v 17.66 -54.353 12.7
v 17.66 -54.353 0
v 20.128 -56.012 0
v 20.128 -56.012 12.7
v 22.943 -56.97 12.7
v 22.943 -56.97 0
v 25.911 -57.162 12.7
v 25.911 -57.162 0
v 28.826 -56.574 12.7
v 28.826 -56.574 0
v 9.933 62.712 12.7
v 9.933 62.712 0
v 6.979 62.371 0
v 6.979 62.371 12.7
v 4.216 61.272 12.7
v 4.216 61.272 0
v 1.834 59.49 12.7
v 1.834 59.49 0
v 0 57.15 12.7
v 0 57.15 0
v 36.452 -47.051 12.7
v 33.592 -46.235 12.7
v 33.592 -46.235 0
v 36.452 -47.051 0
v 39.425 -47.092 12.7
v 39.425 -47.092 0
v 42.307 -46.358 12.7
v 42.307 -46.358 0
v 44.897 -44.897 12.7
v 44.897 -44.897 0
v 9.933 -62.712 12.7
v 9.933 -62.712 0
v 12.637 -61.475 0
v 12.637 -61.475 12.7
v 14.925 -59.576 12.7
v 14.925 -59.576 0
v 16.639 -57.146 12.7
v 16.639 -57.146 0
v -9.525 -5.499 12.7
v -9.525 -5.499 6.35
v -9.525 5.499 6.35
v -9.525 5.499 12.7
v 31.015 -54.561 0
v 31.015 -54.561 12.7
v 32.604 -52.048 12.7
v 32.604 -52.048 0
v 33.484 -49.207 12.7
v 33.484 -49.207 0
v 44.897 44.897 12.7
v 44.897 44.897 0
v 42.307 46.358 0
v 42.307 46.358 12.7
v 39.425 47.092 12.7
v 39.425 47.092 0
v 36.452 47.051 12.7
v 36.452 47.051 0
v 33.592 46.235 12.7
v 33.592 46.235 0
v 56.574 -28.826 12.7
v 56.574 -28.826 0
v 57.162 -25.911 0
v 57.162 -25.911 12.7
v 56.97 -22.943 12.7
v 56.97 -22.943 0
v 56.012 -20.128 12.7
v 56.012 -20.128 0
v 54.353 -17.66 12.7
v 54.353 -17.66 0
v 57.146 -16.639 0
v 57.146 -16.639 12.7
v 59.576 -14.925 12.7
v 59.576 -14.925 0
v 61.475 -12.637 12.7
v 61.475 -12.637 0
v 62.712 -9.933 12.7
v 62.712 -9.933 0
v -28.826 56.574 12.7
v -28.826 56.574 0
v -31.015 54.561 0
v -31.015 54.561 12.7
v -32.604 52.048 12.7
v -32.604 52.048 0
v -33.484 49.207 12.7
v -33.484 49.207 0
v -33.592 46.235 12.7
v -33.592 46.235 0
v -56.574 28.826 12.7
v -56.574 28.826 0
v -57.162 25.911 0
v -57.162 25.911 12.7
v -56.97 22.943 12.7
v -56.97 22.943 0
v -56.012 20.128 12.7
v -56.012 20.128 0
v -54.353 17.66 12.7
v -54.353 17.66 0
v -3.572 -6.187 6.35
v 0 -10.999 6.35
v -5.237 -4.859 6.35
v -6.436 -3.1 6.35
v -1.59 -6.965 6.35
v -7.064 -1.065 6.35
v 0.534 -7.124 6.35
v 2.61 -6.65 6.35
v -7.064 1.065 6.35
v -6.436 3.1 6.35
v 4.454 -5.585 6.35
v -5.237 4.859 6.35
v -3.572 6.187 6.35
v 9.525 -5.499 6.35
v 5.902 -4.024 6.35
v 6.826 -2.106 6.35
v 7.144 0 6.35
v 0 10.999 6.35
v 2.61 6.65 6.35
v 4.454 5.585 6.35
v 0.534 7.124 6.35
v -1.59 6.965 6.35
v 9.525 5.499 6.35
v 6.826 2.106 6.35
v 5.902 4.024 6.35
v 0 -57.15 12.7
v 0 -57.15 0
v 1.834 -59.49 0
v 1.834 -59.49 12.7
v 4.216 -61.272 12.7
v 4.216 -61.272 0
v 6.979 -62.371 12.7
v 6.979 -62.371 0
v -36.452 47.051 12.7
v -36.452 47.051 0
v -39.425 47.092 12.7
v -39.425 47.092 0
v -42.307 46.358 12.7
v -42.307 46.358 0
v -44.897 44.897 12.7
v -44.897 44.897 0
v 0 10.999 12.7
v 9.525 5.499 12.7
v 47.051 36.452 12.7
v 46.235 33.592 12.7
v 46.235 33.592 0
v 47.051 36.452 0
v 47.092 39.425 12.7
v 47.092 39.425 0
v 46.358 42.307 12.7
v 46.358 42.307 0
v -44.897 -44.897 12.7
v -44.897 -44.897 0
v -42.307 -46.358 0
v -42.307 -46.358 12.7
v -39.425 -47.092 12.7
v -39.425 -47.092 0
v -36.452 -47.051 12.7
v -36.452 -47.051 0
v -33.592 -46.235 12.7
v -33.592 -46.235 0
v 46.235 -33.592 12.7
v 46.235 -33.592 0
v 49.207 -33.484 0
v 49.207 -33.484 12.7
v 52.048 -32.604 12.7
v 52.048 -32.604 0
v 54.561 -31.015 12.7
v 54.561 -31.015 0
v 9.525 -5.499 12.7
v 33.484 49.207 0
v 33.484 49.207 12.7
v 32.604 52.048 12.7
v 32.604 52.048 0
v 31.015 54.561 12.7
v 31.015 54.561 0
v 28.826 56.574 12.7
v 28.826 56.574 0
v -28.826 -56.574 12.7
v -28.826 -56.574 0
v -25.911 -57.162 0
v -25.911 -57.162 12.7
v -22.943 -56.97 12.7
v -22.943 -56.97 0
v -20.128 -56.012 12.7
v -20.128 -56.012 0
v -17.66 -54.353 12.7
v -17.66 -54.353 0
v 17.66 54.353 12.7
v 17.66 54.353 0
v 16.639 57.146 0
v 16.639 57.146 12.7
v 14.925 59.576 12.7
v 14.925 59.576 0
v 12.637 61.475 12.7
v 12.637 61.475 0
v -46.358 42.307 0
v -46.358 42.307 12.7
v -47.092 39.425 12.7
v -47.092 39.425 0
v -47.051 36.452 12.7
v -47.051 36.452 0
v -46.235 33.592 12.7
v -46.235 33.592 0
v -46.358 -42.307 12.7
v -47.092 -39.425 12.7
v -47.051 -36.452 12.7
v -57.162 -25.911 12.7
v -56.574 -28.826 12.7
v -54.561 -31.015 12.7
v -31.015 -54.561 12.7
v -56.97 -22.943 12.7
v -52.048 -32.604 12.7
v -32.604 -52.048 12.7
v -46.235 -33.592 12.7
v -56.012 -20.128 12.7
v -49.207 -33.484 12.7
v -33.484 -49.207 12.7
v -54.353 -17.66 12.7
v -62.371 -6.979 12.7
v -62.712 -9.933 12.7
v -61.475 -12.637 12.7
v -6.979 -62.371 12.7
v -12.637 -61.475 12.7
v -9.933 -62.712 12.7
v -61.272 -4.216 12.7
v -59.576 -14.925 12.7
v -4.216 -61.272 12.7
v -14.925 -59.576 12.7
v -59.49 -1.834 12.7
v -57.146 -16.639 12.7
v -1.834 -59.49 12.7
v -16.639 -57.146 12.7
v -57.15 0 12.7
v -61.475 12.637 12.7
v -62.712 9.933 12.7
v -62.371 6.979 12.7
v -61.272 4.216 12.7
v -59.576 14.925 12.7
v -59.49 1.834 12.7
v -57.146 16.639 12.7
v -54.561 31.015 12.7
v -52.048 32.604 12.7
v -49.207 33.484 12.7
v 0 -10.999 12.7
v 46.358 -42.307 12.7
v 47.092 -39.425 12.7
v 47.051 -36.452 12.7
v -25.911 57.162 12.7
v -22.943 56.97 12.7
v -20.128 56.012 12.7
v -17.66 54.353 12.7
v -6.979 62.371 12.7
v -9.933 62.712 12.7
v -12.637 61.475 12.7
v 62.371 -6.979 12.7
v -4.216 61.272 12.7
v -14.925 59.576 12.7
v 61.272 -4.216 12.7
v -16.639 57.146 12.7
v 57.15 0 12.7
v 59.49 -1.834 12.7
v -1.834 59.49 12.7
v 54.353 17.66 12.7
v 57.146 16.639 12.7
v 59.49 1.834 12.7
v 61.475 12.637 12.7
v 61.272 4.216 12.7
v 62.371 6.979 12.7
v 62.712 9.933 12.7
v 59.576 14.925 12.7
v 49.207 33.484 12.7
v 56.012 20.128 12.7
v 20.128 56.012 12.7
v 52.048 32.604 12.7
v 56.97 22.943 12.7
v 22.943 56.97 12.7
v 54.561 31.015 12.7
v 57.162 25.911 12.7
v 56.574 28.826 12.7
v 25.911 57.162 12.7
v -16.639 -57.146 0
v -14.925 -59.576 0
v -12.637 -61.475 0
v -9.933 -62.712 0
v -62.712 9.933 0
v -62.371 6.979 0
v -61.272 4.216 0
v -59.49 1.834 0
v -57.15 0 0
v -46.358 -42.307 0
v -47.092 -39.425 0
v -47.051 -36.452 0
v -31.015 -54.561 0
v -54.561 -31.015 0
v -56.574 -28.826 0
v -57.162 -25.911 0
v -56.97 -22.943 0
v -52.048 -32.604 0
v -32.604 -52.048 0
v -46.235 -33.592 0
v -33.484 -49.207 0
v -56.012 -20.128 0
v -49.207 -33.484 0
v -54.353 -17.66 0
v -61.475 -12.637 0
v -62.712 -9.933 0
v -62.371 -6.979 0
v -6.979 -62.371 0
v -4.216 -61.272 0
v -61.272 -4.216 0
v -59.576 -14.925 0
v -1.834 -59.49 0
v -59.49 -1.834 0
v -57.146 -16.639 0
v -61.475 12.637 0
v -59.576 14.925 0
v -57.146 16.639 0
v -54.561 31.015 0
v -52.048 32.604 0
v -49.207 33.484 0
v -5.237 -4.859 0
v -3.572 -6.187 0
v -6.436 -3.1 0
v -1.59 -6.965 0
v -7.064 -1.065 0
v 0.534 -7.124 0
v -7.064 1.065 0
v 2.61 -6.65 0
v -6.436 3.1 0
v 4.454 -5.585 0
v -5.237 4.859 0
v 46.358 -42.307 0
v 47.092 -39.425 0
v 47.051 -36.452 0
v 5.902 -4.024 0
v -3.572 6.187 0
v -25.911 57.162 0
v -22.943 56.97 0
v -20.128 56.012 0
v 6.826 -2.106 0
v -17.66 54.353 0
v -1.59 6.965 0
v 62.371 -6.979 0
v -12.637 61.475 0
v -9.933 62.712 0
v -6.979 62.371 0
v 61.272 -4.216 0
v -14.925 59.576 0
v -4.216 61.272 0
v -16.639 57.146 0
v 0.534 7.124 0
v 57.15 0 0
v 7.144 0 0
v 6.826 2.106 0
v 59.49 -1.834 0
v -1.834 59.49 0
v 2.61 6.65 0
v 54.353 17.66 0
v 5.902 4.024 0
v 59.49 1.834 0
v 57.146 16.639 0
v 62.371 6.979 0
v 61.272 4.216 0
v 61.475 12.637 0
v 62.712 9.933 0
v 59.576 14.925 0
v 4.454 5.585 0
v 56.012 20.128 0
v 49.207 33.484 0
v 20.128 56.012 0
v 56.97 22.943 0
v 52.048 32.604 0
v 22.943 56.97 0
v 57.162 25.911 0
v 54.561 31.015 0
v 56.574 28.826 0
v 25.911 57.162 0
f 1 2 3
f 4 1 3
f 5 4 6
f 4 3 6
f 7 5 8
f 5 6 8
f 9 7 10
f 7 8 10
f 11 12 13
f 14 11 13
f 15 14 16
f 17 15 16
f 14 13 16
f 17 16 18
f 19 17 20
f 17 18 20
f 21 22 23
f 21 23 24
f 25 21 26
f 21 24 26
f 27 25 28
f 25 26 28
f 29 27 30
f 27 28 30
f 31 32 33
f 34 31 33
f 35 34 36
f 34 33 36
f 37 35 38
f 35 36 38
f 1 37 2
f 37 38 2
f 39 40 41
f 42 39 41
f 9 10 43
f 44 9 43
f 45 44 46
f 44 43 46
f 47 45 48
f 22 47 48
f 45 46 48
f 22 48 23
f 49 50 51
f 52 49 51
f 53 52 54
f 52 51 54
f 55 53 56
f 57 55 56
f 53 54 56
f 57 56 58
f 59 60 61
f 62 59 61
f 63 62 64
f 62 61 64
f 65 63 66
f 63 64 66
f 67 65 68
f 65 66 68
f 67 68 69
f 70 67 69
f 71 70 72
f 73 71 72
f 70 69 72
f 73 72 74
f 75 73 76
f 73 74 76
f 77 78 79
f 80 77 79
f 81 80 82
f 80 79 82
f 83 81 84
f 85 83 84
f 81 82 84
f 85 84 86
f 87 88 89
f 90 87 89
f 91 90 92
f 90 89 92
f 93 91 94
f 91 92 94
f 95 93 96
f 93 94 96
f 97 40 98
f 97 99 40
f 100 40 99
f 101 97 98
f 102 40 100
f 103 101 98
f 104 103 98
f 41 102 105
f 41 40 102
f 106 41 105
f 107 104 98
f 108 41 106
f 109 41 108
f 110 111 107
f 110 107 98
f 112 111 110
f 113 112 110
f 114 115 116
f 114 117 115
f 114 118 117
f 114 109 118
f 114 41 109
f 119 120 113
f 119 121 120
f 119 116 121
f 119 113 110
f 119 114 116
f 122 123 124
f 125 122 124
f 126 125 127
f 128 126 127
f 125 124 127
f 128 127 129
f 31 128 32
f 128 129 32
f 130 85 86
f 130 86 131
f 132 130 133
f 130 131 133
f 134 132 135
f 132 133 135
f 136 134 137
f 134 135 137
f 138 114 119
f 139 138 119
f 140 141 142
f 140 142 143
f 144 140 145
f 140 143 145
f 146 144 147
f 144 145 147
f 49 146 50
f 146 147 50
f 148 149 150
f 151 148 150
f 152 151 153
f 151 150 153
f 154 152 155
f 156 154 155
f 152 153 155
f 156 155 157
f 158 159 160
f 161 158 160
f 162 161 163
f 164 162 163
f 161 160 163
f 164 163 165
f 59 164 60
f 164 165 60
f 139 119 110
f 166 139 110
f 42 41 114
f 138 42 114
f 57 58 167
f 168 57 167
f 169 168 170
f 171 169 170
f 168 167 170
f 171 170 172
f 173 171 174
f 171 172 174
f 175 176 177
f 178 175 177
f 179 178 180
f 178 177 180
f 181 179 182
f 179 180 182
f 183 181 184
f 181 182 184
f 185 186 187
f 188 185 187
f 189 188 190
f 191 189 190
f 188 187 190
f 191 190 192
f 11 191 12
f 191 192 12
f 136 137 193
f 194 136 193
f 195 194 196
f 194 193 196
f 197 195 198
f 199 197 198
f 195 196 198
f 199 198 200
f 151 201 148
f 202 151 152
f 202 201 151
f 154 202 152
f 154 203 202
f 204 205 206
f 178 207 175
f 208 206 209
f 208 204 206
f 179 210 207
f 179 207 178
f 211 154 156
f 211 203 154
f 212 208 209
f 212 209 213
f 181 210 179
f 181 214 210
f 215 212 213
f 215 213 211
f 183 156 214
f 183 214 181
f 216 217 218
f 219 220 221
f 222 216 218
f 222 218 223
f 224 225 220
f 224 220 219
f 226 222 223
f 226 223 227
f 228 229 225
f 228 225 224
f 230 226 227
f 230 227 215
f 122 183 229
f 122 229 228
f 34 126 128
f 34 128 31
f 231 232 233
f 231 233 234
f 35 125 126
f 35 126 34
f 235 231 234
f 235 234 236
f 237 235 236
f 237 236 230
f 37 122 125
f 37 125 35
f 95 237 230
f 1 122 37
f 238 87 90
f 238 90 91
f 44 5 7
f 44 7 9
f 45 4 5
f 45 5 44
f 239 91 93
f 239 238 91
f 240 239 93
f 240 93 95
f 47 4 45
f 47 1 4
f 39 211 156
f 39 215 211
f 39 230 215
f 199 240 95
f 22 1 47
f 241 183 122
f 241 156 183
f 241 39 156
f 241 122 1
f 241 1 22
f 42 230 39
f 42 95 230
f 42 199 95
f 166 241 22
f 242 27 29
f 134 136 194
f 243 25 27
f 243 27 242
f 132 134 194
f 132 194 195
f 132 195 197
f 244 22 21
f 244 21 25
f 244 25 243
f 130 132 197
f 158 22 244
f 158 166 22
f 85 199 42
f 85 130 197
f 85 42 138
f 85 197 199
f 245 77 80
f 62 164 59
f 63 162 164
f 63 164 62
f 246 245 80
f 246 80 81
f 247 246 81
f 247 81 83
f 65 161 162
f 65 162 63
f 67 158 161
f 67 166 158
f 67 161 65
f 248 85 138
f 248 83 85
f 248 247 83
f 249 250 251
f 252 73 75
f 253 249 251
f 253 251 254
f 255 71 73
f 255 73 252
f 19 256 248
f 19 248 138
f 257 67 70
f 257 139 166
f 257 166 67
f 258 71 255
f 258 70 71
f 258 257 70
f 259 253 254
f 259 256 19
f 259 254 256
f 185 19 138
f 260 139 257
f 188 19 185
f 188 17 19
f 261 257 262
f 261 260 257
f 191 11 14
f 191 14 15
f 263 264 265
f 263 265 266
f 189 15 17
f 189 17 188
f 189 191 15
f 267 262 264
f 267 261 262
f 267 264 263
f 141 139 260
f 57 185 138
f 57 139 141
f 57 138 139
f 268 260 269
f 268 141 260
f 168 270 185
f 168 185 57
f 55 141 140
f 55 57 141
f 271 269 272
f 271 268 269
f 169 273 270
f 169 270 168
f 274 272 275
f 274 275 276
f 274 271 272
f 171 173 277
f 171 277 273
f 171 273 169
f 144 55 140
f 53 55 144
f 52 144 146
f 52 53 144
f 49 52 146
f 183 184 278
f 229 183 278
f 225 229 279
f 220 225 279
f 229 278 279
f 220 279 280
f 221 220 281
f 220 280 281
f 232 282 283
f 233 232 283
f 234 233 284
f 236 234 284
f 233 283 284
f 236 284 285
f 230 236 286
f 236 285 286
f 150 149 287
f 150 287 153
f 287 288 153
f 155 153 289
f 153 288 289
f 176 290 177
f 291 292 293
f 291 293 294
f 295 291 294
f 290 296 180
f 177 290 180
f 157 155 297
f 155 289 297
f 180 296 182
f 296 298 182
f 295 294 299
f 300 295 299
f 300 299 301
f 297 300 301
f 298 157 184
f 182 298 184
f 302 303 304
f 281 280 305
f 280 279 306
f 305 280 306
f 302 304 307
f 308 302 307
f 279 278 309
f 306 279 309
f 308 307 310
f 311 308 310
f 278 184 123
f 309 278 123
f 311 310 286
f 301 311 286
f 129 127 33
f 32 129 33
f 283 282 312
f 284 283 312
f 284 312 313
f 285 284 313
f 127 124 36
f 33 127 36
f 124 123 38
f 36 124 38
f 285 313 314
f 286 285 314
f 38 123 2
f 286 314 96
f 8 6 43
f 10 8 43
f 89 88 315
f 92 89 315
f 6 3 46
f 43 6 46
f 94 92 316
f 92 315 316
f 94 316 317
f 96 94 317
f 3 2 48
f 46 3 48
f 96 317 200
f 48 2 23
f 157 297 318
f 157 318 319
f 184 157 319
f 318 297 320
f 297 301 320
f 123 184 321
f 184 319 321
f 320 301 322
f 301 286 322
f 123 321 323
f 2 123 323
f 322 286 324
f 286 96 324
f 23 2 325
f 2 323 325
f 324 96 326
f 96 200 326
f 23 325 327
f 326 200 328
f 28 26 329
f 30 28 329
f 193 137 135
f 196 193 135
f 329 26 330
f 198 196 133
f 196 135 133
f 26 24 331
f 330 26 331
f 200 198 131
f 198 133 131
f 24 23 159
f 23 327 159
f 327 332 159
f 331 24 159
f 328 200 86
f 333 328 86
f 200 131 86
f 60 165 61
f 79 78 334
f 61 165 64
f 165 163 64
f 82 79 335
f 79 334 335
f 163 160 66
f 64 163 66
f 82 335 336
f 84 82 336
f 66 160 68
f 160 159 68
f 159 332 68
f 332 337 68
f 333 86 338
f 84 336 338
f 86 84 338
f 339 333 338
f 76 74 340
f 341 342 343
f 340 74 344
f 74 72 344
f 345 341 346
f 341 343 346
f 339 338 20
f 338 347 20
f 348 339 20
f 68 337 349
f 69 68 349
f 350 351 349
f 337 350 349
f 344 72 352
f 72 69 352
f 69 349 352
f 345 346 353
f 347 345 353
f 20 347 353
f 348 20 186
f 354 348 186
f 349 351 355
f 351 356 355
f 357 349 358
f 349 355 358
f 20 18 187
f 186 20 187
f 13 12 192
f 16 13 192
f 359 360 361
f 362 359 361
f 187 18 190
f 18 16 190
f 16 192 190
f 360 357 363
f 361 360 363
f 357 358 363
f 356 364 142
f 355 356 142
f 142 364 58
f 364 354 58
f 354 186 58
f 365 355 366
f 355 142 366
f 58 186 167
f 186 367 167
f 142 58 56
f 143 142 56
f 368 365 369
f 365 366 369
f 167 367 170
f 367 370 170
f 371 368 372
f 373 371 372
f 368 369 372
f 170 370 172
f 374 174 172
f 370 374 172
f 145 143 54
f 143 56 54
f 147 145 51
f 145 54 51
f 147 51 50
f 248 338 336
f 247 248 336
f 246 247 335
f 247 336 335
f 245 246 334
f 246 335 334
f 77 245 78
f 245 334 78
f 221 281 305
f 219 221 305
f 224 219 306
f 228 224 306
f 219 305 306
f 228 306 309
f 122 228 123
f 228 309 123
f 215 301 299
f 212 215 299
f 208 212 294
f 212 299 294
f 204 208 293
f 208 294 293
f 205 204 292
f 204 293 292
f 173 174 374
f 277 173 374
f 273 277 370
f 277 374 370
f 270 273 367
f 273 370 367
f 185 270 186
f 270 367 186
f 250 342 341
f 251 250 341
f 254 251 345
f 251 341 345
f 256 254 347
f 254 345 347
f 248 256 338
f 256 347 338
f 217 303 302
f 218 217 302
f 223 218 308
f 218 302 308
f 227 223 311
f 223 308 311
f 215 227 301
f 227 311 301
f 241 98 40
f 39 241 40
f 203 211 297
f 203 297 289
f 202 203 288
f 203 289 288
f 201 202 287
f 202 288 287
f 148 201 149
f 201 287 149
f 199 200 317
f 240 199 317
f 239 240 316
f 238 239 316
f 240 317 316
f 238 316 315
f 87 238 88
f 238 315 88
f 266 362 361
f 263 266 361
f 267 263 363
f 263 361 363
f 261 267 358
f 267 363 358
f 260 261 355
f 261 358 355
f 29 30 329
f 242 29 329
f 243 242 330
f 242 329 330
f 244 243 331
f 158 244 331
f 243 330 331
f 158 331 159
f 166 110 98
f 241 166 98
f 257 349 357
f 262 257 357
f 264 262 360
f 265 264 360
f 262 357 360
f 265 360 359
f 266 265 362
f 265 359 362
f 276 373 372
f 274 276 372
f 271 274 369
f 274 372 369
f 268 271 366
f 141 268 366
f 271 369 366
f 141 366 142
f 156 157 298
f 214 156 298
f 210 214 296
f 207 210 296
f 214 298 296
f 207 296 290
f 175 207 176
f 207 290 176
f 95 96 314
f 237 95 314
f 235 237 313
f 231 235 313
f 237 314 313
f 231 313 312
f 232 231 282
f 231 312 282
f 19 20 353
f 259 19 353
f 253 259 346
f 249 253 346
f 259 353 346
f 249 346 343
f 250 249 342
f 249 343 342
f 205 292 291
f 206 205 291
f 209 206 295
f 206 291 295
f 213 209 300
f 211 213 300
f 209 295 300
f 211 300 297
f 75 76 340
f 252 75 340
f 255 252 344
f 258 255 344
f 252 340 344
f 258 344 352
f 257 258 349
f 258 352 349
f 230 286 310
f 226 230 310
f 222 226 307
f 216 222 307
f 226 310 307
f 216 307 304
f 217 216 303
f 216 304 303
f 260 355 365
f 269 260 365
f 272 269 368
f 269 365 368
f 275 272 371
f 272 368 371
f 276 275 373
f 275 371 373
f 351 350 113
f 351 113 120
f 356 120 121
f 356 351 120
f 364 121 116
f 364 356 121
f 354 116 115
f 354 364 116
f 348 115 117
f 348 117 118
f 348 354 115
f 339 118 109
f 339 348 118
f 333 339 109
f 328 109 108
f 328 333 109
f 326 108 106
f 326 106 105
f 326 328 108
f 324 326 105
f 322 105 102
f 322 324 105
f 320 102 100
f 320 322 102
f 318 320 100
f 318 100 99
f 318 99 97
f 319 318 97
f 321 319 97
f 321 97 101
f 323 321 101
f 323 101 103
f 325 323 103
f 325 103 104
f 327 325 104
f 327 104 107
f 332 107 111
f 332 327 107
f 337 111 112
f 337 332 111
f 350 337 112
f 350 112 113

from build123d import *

# Parameters (mm, degrees)
F2_DEPTH = 12.7
F1_R     = 7.14375
F3_DEPTH = 6.35


with BuildPart() as f2:
    # F1 (on Top) → F2 (new body)
    with BuildSketch(Plane.XY):
        with BuildLine():
            ThreePointArc((57.15, 0), (61.2719466085, 4.2155230865), (62.7124900485, 9.9326826377))
            ThreePointArc((62.7124900485, 9.9326826377), (59.575752362, 14.9248720794), (54.3528799063, 17.6603212285))
            ThreePointArc((54.3528799063, 17.6603212285), (56.9704158142, 22.9432734815), (56.5737545789, 28.8257677314))
            ThreePointArc((56.5737545789, 28.8257677314), (52.0478683856, 32.6043167785), (46.2353212285, 33.5919271685))
            ThreePointArc((46.2353212285, 33.5919271685), (47.0922237837, 39.4251764129), (44.8971858387, 44.8971858387))
            ThreePointArc((44.8971858387, 44.8971858387), (39.4251764129, 47.0922237837), (33.5919271685, 46.2353212285))
            ThreePointArc((33.5919271685, 46.2353212285), (32.6043167785, 52.0478683856), (28.8257677314, 56.5737545789))
            ThreePointArc((28.8257677314, 56.5737545789), (22.9432734815, 56.9704158142), (17.6603212285, 54.3528799063))
            ThreePointArc((17.6603212285, 54.3528799063), (14.9248720794, 59.575752362), (9.9326826377, 62.7124900485))
            ThreePointArc((9.9326826377, 62.7124900485), (4.2155230865, 61.2719466085), (0, 57.15))
            ThreePointArc((0, 57.15), (-4.2155230865, 61.2719466085), (-9.9326826377, 62.7124900485))
            ThreePointArc((-9.9326826377, 62.7124900485), (-14.9248720794, 59.575752362), (-17.6603212285, 54.3528799063))
            ThreePointArc((-17.6603212285, 54.3528799063), (-22.9432734815, 56.9704158142), (-28.8257677314, 56.5737545789))
            ThreePointArc((-28.8257677314, 56.5737545789), (-32.6043167785, 52.0478683856), (-33.5919271685, 46.2353212285))
            ThreePointArc((-33.5919271685, 46.2353212285), (-39.4251764129, 47.0922237837), (-44.8971858387, 44.8971858387))
            ThreePointArc((-44.8971858387, 44.8971858387), (-47.0922237837, 39.4251764129), (-46.2353212285, 33.5919271685))
            ThreePointArc((-46.2353212285, 33.5919271685), (-52.0478683856, 32.6043167785), (-56.5737545789, 28.8257677314))
            ThreePointArc((-56.5737545789, 28.8257677314), (-56.9704158142, 22.9432734815), (-54.3528799063, 17.6603212285))
            ThreePointArc((-54.3528799063, 17.6603212285), (-59.575752362, 14.9248720794), (-62.7124900485, 9.9326826377))
            ThreePointArc((-62.7124900485, 9.9326826377), (-61.2719466085, 4.2155230865), (-57.15, 0))
            ThreePointArc((-57.15, 0), (-61.2719466085, -4.2155230865), (-62.7124900485, -9.9326826377))
            ThreePointArc((-62.7124900485, -9.9326826377), (-59.575752362, -14.9248720794), (-54.3528799063, -17.6603212285))
            ThreePointArc((-54.3528799063, -17.6603212285), (-56.9704158142, -22.9432734815), (-56.5737545789, -28.8257677314))
            ThreePointArc((-56.5737545789, -28.8257677314), (-52.0478683856, -32.6043167785), (-46.2353212285, -33.5919271685))
            ThreePointArc((-46.2353212285, -33.5919271685), (-47.0922237837, -39.4251764129), (-44.8971858387, -44.8971858387))
            ThreePointArc((-44.8971858387, -44.8971858387), (-39.4251764129, -47.0922237837), (-33.5919271685, -46.2353212285))
            ThreePointArc((-33.5919271685, -46.2353212285), (-32.6043167785, -52.0478683856), (-28.8257677314, -56.5737545789))
            ThreePointArc((-28.8257677314, -56.5737545789), (-22.9432734815, -56.9704158142), (-17.6603212285, -54.3528799063))
            ThreePointArc((-17.6603212285, -54.3528799063), (-14.9248720794, -59.575752362), (-9.9326826377, -62.7124900485))
            ThreePointArc((-9.9326826377, -62.7124900485), (-4.2155230865, -61.2719466085), (0, -57.15))
            ThreePointArc((0, -57.15), (4.2155230865, -61.2719466085), (9.9326826377, -62.7124900485))
            ThreePointArc((9.9326826377, -62.7124900485), (14.9248720794, -59.575752362), (17.6603212285, -54.3528799063))
            ThreePointArc((17.6603212285, -54.3528799063), (22.9432734815, -56.9704158142), (28.8257677314, -56.5737545789))
            ThreePointArc((28.8257677314, -56.5737545789), (32.6043167785, -52.0478683856), (33.5919271685, -46.2353212285))
            ThreePointArc((33.5919271685, -46.2353212285), (39.4251764129, -47.0922237837), (44.8971858387, -44.8971858387))
            ThreePointArc((44.8971858387, -44.8971858387), (47.0922237837, -39.4251764129), (46.2353212285, -33.5919271685))
            ThreePointArc((46.2353212285, -33.5919271685), (52.0478683856, -32.6043167785), (56.5737545789, -28.8257677314))
            ThreePointArc((56.5737545789, -28.8257677314), (56.9704158142, -22.9432734815), (54.3528799063, -17.6603212285))
            ThreePointArc((54.3528799063, -17.6603212285), (59.575752362, -14.9248720794), (62.7124900485, -9.9326826377))
            ThreePointArc((62.7124900485, -9.9326826377), (61.2719466085, -4.2155230865), (57.15, 0))
        make_face()
        Polygon((0, 10.9985226281), (9.525, 5.499261314), (9.525, -5.499261314), (0, -10.9985226281), (-9.525, -5.499261314), (-9.525, 5.499261314), align=None, mode=Mode.SUBTRACT)
    extrude(amount=F2_DEPTH)

    # F1 (on Top) → F3 (join)
    with BuildSketch(Plane.XY):
        Polygon((9.525, -5.499261314), (9.525, 5.499261314), (0, 10.9985226281), (-9.525, 5.499261314), (-9.525, -5.499261314), (0, -10.9985226281), align=None)
        Circle(F1_R, mode=Mode.SUBTRACT)
    extrude(amount=F3_DEPTH)


solid = f2.part
